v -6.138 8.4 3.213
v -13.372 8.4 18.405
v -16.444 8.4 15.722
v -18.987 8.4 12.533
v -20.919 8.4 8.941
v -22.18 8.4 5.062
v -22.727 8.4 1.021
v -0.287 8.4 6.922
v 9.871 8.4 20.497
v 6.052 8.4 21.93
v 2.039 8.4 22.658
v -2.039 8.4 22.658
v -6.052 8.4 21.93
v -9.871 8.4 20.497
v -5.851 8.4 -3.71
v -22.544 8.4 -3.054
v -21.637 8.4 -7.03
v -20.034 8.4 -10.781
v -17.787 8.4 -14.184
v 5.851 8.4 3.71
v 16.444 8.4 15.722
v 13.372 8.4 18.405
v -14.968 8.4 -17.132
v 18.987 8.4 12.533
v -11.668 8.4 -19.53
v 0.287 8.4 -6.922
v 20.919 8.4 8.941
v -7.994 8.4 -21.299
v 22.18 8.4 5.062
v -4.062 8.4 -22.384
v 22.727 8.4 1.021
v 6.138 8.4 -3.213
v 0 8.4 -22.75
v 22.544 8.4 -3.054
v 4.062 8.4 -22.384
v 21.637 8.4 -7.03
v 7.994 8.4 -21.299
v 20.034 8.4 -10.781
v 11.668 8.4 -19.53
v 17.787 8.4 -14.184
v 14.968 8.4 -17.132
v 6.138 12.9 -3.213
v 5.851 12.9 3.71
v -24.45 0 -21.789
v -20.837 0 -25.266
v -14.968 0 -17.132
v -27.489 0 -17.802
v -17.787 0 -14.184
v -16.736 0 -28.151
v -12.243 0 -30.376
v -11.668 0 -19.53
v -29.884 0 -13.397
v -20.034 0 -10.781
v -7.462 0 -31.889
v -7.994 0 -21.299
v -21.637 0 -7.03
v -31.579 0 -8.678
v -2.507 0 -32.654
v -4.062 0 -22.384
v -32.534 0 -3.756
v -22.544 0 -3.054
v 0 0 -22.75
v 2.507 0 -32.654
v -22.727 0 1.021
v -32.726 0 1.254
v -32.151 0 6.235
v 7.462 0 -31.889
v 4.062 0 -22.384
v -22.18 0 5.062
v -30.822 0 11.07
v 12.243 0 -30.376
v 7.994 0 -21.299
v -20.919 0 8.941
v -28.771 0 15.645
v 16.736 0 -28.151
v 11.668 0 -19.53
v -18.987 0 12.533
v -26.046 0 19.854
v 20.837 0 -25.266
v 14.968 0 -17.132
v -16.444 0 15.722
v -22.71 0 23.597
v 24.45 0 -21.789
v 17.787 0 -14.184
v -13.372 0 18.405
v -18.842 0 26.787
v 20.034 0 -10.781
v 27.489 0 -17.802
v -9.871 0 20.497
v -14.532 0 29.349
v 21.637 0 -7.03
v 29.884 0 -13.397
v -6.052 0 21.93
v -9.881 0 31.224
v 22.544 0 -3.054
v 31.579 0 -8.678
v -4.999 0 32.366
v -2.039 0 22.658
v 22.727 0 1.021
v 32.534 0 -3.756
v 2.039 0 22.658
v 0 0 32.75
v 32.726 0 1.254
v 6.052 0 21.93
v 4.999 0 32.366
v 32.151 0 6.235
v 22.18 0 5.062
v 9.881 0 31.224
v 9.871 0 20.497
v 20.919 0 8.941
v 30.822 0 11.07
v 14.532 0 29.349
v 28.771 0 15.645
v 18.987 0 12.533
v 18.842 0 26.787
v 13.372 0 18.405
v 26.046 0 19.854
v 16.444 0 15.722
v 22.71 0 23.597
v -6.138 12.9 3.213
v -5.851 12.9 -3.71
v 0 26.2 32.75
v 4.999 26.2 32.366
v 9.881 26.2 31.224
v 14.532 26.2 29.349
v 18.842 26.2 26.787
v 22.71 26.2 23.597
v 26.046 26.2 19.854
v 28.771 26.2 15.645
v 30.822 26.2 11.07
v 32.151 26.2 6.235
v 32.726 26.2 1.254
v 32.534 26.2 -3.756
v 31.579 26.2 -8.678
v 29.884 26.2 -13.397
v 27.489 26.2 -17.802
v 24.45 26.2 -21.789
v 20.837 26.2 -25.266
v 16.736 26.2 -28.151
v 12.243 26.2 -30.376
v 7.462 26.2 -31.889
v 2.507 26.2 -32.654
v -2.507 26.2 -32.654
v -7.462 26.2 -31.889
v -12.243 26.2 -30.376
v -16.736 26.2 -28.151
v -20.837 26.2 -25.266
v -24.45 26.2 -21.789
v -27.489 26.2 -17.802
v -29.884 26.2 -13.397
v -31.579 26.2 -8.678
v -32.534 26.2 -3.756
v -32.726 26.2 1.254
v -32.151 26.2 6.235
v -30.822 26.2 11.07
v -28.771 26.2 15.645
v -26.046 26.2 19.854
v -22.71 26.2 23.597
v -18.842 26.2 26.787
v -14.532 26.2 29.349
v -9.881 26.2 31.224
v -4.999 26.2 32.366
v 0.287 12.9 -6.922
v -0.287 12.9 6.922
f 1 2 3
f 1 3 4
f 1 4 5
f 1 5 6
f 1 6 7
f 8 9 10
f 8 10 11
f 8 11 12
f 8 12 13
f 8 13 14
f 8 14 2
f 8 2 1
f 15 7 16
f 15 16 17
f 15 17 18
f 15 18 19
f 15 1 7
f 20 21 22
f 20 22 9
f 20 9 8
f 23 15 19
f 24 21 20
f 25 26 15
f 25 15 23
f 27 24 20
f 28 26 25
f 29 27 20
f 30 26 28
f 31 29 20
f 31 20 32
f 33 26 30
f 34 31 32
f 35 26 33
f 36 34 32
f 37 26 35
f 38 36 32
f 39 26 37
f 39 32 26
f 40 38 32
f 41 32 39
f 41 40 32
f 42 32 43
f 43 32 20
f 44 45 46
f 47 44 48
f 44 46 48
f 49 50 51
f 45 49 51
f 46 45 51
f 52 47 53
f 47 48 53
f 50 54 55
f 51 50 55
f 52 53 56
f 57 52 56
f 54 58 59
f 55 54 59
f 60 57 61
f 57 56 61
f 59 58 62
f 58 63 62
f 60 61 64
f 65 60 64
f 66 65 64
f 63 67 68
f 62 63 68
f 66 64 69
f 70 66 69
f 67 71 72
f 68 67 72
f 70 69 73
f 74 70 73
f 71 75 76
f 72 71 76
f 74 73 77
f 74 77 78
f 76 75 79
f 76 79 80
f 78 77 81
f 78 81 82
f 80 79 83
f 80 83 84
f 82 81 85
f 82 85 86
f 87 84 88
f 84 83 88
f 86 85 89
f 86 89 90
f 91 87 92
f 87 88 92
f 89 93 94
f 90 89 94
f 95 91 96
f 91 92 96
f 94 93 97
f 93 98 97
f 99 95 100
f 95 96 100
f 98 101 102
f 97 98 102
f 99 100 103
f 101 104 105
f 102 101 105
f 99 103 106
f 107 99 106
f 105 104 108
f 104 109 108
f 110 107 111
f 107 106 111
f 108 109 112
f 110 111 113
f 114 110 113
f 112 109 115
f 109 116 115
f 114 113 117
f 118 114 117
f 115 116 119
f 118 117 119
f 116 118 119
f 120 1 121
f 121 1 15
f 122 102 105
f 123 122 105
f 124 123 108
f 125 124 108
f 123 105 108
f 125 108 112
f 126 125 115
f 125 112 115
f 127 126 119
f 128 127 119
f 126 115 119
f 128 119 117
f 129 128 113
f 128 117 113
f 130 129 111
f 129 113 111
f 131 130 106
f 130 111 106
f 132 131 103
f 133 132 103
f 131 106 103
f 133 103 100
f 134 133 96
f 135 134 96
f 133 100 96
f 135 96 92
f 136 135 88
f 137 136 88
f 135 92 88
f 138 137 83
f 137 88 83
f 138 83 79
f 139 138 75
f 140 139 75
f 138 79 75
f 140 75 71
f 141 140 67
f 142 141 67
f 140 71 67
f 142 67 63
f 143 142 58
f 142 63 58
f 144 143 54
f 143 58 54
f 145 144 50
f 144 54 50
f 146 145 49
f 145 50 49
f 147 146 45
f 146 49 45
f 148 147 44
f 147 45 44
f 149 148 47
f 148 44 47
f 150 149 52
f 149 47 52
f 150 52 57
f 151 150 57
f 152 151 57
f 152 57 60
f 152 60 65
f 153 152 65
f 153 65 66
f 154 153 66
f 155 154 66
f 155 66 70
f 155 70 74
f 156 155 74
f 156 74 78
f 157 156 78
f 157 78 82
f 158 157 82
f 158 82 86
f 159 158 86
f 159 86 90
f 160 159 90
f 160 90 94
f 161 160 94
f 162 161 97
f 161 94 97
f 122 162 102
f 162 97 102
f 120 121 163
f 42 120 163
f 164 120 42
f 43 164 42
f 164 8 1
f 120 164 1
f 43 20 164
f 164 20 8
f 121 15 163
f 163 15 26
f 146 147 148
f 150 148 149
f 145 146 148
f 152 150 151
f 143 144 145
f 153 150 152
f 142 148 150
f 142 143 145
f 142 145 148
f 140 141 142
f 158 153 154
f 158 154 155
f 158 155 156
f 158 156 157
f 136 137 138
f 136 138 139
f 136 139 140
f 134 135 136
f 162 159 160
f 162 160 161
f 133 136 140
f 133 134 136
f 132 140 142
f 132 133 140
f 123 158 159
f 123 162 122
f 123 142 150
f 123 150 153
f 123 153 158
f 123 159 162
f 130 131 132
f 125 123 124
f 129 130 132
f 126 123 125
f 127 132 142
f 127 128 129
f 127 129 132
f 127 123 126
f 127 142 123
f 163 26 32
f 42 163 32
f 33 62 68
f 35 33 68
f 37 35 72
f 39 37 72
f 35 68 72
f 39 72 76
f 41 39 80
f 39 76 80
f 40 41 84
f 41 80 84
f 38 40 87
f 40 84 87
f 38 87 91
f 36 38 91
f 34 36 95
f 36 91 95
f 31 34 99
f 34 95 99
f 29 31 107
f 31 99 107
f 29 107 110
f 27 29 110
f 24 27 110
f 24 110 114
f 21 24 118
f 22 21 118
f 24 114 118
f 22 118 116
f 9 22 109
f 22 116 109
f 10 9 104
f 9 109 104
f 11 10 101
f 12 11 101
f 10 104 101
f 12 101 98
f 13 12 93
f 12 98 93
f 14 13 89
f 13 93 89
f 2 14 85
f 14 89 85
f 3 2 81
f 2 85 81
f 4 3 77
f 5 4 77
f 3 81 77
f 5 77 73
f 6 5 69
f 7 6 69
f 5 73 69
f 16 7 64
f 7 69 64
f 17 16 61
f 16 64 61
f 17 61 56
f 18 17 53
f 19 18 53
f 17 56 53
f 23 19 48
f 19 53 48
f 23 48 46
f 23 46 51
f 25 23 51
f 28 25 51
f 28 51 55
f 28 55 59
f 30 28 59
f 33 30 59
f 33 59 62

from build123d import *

# Parameters (mm, degrees)
SKETCH1_R           = 32.750000032
BOSS_EXTRUDE1_DEPTH = 26.199999924
SKETCH3_R           = 22.749999966
CUT_EXTRUDE1_DEPTH  = 8.399999964
CUT_EXTRUDE2_DEPTH  = 4.49999989


with BuildPart() as part:
    # Sketch1 → Boss-Extrude1 (new body)
    with BuildSketch(Plane(origin=(0, 0, 0), x_dir=(1, 0, 0), z_dir=(0, 1, 0))):
        with Locations(Location((0, 0, 0), (0, 0, 270))):
            Circle(SKETCH1_R)
    extrude(amount=BOSS_EXTRUDE1_DEPTH)

    # Sketch3 → Cut-Extrude1 (cut)
    with BuildSketch(Plane.XZ):
        with Locations(Location((0, 0, 0), (0, 0, 270))):
            Circle(SKETCH3_R)
    extrude(amount=-CUT_EXTRUDE1_DEPTH, mode=Mode.SUBTRACT)

    # Sketch4 → Cut-Extrude2 (cut)
    with BuildSketch(Plane.XZ.offset(-8.399999964)):
        Polygon((-5.851405972, -3.709588544), (0.286894931, -6.922260491), (6.138300902, -3.212671947), (5.851405972, 3.709588544), (-0.286894931, 6.922260491), (-6.138300902, 3.212671947), align=None)
    extrude(amount=-CUT_EXTRUDE2_DEPTH, mode=Mode.SUBTRACT)


solid = part.part
